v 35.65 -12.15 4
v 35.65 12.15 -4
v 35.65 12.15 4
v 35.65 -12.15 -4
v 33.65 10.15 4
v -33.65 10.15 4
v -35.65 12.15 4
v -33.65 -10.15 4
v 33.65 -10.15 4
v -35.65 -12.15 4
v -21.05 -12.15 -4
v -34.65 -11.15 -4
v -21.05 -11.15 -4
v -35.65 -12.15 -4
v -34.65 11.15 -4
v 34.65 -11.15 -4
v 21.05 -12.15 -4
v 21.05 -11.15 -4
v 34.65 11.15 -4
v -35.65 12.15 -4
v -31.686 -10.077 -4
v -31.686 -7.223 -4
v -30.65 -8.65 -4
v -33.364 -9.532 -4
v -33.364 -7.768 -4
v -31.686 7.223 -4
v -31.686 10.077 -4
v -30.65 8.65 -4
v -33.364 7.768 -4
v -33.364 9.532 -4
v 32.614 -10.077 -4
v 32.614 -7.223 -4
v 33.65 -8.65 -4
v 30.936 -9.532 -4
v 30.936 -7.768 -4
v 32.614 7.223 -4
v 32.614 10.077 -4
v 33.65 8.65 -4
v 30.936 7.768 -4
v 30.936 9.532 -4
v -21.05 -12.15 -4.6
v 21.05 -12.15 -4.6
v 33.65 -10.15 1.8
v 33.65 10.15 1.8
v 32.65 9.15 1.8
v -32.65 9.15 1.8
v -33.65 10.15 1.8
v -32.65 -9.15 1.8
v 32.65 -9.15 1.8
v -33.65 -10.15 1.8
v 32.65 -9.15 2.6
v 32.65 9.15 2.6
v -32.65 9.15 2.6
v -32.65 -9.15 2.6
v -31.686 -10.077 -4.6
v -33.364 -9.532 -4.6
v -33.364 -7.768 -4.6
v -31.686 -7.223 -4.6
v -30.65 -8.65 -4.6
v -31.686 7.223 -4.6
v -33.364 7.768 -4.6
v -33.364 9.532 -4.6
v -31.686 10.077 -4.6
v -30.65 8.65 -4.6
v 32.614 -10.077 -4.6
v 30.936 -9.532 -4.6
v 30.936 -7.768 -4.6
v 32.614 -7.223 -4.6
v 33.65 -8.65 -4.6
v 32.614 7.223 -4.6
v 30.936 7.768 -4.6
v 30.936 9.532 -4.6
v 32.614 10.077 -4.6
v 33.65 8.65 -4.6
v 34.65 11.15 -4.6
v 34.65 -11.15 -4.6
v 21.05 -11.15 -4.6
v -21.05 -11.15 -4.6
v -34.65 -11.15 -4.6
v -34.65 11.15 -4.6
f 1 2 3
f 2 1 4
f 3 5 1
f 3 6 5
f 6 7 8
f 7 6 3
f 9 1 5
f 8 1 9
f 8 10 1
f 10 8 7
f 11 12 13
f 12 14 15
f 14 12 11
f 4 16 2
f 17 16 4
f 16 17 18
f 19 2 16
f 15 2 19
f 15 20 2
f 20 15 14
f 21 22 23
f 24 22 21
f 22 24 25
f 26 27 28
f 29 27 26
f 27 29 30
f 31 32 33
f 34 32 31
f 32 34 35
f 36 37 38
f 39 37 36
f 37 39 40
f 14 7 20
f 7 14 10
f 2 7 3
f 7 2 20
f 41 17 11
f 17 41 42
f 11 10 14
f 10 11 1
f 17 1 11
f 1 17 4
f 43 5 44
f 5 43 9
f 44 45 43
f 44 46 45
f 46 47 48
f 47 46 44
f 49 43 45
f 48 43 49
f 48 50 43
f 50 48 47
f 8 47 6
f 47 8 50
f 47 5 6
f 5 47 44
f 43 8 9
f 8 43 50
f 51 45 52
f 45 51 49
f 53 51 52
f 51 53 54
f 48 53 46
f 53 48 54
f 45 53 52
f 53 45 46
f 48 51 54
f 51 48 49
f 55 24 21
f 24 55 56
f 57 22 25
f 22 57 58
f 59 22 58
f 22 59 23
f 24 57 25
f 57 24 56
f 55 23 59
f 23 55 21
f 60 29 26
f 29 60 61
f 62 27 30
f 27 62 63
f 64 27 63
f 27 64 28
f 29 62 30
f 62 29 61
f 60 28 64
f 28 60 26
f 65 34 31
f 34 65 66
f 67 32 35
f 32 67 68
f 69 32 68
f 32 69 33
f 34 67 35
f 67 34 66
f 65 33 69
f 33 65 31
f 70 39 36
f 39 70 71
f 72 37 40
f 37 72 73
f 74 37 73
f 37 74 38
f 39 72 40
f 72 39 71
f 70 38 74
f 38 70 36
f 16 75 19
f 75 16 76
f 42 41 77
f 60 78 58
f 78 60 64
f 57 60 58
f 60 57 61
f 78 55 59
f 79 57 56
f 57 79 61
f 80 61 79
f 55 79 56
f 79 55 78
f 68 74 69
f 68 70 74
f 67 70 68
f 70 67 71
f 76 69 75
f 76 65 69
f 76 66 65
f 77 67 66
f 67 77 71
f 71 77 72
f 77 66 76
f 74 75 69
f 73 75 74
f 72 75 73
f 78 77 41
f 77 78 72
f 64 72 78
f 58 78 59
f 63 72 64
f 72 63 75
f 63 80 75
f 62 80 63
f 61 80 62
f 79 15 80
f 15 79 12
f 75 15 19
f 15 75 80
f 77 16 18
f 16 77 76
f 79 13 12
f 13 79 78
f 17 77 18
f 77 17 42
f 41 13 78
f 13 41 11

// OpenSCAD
// Parameters
width_mm = 71.3; //[35.65:142.6:0.1]
height_mm = 24.3; //[12.15:48.6:0.1]
thickness_mm = 8.0; //[4.0:16.0:0.1]
aperture_margin_mm = 2.0; //[1.0:6.0:0.1]
aperture_depth_mm = 1.2; //[0.5:3.0:0.1]
window_thickness_mm = 0.8; //[0.4:2.0:0.1]
pcb_thickness_mm = 1.6; //[0.8:3.2:0.1]
pcb_margin_mm = 1.0; //[0.5:4.0:0.1]
mount_hole_diameter_mm = 3.0; //[1.5:6.0:0.1]
mount_hole_edge_offset_mm = 2.5; //[1.0:6.0:0.1]
pin_header_pitch_mm = 2.54; //[1.27:5.08:0.01]
pin_count = 16; //[8:24:1]
pin_header_depth_mm = 3.0; //[1.5:8.0:0.1]
pin_header_height_mm = 3.0; //[1.5:8.0:0.1]
pin_header_side_margin_mm = 2.0; //[0.5:6.0:0.1]
overlap_mm = 1.0; //[0.5:2.0:0.1]

// Display module - complete geometry
module display() {
  color([0.0, 0.4, 0.2]) { // PCB green
    // Main body
    difference() {
      cube([width_mm, height_mm, thickness_mm], center=true);
      // Aperture cutout
      translate([0, 0, thickness_mm/2 - (aperture_depth_mm + overlap_mm)/2])
        cube([width_mm - 2*aperture_margin_mm, height_mm - 2*aperture_margin_mm, aperture_depth_mm + overlap_mm], center=true);
    }
    // Display aperture window
    translate([0, 0, thickness_mm/2 - aperture_depth_mm + window_thickness_mm/2 - overlap_mm])
      cube([width_mm - 2*aperture_margin_mm - 2*overlap_mm, height_mm - 2*aperture_margin_mm - 2*overlap_mm, window_thickness_mm], center=true);
  }
}

// Mod - complete geometry
module mod() {
  color([0.1, 0.1, 0.6]) { // PCB blue
    // PCB backing plate with mounting holes
    difference() {
      translate([0, 0, -thickness_mm/2 - pcb_thickness_mm/2 + overlap_mm])
        cube([width_mm - 2*pcb_margin_mm, height_mm - 2*pcb_margin_mm, pcb_thickness_mm], center=true);
      // Mounting holes
      for (x = [-1, 1])
        for (y = [-1, 1])
          translate([x*((width_mm - 2*pcb_margin_mm)/2 - mount_hole_edge_offset_mm), y*((height_mm - 2*pcb_margin_mm)/2 - mount_hole_edge_offset_mm), -thickness_mm/2 - pcb_thickness_mm/2 + overlap_mm])
            cylinder(r=mount_hole_diameter_mm/2, h=pcb_thickness_mm + overlap_mm*2, center=true);
    }
    // Pin header region
    translate([0, -(height_mm - 2*pcb_margin_mm)/2 + pin_header_depth_mm/2 - overlap_mm, -thickness_mm/2 - pcb_thickness_mm + pin_header_height_mm/2 + overlap_mm])
      cube([(pin_count - 1)*pin_header_pitch_mm + 2*pin_header_side_margin_mm, pin_header_depth_mm, pin_header_height_mm], center=true);
  }
}

// Assembly
module assembly() {
  display();
  mod();
}

assembly();
